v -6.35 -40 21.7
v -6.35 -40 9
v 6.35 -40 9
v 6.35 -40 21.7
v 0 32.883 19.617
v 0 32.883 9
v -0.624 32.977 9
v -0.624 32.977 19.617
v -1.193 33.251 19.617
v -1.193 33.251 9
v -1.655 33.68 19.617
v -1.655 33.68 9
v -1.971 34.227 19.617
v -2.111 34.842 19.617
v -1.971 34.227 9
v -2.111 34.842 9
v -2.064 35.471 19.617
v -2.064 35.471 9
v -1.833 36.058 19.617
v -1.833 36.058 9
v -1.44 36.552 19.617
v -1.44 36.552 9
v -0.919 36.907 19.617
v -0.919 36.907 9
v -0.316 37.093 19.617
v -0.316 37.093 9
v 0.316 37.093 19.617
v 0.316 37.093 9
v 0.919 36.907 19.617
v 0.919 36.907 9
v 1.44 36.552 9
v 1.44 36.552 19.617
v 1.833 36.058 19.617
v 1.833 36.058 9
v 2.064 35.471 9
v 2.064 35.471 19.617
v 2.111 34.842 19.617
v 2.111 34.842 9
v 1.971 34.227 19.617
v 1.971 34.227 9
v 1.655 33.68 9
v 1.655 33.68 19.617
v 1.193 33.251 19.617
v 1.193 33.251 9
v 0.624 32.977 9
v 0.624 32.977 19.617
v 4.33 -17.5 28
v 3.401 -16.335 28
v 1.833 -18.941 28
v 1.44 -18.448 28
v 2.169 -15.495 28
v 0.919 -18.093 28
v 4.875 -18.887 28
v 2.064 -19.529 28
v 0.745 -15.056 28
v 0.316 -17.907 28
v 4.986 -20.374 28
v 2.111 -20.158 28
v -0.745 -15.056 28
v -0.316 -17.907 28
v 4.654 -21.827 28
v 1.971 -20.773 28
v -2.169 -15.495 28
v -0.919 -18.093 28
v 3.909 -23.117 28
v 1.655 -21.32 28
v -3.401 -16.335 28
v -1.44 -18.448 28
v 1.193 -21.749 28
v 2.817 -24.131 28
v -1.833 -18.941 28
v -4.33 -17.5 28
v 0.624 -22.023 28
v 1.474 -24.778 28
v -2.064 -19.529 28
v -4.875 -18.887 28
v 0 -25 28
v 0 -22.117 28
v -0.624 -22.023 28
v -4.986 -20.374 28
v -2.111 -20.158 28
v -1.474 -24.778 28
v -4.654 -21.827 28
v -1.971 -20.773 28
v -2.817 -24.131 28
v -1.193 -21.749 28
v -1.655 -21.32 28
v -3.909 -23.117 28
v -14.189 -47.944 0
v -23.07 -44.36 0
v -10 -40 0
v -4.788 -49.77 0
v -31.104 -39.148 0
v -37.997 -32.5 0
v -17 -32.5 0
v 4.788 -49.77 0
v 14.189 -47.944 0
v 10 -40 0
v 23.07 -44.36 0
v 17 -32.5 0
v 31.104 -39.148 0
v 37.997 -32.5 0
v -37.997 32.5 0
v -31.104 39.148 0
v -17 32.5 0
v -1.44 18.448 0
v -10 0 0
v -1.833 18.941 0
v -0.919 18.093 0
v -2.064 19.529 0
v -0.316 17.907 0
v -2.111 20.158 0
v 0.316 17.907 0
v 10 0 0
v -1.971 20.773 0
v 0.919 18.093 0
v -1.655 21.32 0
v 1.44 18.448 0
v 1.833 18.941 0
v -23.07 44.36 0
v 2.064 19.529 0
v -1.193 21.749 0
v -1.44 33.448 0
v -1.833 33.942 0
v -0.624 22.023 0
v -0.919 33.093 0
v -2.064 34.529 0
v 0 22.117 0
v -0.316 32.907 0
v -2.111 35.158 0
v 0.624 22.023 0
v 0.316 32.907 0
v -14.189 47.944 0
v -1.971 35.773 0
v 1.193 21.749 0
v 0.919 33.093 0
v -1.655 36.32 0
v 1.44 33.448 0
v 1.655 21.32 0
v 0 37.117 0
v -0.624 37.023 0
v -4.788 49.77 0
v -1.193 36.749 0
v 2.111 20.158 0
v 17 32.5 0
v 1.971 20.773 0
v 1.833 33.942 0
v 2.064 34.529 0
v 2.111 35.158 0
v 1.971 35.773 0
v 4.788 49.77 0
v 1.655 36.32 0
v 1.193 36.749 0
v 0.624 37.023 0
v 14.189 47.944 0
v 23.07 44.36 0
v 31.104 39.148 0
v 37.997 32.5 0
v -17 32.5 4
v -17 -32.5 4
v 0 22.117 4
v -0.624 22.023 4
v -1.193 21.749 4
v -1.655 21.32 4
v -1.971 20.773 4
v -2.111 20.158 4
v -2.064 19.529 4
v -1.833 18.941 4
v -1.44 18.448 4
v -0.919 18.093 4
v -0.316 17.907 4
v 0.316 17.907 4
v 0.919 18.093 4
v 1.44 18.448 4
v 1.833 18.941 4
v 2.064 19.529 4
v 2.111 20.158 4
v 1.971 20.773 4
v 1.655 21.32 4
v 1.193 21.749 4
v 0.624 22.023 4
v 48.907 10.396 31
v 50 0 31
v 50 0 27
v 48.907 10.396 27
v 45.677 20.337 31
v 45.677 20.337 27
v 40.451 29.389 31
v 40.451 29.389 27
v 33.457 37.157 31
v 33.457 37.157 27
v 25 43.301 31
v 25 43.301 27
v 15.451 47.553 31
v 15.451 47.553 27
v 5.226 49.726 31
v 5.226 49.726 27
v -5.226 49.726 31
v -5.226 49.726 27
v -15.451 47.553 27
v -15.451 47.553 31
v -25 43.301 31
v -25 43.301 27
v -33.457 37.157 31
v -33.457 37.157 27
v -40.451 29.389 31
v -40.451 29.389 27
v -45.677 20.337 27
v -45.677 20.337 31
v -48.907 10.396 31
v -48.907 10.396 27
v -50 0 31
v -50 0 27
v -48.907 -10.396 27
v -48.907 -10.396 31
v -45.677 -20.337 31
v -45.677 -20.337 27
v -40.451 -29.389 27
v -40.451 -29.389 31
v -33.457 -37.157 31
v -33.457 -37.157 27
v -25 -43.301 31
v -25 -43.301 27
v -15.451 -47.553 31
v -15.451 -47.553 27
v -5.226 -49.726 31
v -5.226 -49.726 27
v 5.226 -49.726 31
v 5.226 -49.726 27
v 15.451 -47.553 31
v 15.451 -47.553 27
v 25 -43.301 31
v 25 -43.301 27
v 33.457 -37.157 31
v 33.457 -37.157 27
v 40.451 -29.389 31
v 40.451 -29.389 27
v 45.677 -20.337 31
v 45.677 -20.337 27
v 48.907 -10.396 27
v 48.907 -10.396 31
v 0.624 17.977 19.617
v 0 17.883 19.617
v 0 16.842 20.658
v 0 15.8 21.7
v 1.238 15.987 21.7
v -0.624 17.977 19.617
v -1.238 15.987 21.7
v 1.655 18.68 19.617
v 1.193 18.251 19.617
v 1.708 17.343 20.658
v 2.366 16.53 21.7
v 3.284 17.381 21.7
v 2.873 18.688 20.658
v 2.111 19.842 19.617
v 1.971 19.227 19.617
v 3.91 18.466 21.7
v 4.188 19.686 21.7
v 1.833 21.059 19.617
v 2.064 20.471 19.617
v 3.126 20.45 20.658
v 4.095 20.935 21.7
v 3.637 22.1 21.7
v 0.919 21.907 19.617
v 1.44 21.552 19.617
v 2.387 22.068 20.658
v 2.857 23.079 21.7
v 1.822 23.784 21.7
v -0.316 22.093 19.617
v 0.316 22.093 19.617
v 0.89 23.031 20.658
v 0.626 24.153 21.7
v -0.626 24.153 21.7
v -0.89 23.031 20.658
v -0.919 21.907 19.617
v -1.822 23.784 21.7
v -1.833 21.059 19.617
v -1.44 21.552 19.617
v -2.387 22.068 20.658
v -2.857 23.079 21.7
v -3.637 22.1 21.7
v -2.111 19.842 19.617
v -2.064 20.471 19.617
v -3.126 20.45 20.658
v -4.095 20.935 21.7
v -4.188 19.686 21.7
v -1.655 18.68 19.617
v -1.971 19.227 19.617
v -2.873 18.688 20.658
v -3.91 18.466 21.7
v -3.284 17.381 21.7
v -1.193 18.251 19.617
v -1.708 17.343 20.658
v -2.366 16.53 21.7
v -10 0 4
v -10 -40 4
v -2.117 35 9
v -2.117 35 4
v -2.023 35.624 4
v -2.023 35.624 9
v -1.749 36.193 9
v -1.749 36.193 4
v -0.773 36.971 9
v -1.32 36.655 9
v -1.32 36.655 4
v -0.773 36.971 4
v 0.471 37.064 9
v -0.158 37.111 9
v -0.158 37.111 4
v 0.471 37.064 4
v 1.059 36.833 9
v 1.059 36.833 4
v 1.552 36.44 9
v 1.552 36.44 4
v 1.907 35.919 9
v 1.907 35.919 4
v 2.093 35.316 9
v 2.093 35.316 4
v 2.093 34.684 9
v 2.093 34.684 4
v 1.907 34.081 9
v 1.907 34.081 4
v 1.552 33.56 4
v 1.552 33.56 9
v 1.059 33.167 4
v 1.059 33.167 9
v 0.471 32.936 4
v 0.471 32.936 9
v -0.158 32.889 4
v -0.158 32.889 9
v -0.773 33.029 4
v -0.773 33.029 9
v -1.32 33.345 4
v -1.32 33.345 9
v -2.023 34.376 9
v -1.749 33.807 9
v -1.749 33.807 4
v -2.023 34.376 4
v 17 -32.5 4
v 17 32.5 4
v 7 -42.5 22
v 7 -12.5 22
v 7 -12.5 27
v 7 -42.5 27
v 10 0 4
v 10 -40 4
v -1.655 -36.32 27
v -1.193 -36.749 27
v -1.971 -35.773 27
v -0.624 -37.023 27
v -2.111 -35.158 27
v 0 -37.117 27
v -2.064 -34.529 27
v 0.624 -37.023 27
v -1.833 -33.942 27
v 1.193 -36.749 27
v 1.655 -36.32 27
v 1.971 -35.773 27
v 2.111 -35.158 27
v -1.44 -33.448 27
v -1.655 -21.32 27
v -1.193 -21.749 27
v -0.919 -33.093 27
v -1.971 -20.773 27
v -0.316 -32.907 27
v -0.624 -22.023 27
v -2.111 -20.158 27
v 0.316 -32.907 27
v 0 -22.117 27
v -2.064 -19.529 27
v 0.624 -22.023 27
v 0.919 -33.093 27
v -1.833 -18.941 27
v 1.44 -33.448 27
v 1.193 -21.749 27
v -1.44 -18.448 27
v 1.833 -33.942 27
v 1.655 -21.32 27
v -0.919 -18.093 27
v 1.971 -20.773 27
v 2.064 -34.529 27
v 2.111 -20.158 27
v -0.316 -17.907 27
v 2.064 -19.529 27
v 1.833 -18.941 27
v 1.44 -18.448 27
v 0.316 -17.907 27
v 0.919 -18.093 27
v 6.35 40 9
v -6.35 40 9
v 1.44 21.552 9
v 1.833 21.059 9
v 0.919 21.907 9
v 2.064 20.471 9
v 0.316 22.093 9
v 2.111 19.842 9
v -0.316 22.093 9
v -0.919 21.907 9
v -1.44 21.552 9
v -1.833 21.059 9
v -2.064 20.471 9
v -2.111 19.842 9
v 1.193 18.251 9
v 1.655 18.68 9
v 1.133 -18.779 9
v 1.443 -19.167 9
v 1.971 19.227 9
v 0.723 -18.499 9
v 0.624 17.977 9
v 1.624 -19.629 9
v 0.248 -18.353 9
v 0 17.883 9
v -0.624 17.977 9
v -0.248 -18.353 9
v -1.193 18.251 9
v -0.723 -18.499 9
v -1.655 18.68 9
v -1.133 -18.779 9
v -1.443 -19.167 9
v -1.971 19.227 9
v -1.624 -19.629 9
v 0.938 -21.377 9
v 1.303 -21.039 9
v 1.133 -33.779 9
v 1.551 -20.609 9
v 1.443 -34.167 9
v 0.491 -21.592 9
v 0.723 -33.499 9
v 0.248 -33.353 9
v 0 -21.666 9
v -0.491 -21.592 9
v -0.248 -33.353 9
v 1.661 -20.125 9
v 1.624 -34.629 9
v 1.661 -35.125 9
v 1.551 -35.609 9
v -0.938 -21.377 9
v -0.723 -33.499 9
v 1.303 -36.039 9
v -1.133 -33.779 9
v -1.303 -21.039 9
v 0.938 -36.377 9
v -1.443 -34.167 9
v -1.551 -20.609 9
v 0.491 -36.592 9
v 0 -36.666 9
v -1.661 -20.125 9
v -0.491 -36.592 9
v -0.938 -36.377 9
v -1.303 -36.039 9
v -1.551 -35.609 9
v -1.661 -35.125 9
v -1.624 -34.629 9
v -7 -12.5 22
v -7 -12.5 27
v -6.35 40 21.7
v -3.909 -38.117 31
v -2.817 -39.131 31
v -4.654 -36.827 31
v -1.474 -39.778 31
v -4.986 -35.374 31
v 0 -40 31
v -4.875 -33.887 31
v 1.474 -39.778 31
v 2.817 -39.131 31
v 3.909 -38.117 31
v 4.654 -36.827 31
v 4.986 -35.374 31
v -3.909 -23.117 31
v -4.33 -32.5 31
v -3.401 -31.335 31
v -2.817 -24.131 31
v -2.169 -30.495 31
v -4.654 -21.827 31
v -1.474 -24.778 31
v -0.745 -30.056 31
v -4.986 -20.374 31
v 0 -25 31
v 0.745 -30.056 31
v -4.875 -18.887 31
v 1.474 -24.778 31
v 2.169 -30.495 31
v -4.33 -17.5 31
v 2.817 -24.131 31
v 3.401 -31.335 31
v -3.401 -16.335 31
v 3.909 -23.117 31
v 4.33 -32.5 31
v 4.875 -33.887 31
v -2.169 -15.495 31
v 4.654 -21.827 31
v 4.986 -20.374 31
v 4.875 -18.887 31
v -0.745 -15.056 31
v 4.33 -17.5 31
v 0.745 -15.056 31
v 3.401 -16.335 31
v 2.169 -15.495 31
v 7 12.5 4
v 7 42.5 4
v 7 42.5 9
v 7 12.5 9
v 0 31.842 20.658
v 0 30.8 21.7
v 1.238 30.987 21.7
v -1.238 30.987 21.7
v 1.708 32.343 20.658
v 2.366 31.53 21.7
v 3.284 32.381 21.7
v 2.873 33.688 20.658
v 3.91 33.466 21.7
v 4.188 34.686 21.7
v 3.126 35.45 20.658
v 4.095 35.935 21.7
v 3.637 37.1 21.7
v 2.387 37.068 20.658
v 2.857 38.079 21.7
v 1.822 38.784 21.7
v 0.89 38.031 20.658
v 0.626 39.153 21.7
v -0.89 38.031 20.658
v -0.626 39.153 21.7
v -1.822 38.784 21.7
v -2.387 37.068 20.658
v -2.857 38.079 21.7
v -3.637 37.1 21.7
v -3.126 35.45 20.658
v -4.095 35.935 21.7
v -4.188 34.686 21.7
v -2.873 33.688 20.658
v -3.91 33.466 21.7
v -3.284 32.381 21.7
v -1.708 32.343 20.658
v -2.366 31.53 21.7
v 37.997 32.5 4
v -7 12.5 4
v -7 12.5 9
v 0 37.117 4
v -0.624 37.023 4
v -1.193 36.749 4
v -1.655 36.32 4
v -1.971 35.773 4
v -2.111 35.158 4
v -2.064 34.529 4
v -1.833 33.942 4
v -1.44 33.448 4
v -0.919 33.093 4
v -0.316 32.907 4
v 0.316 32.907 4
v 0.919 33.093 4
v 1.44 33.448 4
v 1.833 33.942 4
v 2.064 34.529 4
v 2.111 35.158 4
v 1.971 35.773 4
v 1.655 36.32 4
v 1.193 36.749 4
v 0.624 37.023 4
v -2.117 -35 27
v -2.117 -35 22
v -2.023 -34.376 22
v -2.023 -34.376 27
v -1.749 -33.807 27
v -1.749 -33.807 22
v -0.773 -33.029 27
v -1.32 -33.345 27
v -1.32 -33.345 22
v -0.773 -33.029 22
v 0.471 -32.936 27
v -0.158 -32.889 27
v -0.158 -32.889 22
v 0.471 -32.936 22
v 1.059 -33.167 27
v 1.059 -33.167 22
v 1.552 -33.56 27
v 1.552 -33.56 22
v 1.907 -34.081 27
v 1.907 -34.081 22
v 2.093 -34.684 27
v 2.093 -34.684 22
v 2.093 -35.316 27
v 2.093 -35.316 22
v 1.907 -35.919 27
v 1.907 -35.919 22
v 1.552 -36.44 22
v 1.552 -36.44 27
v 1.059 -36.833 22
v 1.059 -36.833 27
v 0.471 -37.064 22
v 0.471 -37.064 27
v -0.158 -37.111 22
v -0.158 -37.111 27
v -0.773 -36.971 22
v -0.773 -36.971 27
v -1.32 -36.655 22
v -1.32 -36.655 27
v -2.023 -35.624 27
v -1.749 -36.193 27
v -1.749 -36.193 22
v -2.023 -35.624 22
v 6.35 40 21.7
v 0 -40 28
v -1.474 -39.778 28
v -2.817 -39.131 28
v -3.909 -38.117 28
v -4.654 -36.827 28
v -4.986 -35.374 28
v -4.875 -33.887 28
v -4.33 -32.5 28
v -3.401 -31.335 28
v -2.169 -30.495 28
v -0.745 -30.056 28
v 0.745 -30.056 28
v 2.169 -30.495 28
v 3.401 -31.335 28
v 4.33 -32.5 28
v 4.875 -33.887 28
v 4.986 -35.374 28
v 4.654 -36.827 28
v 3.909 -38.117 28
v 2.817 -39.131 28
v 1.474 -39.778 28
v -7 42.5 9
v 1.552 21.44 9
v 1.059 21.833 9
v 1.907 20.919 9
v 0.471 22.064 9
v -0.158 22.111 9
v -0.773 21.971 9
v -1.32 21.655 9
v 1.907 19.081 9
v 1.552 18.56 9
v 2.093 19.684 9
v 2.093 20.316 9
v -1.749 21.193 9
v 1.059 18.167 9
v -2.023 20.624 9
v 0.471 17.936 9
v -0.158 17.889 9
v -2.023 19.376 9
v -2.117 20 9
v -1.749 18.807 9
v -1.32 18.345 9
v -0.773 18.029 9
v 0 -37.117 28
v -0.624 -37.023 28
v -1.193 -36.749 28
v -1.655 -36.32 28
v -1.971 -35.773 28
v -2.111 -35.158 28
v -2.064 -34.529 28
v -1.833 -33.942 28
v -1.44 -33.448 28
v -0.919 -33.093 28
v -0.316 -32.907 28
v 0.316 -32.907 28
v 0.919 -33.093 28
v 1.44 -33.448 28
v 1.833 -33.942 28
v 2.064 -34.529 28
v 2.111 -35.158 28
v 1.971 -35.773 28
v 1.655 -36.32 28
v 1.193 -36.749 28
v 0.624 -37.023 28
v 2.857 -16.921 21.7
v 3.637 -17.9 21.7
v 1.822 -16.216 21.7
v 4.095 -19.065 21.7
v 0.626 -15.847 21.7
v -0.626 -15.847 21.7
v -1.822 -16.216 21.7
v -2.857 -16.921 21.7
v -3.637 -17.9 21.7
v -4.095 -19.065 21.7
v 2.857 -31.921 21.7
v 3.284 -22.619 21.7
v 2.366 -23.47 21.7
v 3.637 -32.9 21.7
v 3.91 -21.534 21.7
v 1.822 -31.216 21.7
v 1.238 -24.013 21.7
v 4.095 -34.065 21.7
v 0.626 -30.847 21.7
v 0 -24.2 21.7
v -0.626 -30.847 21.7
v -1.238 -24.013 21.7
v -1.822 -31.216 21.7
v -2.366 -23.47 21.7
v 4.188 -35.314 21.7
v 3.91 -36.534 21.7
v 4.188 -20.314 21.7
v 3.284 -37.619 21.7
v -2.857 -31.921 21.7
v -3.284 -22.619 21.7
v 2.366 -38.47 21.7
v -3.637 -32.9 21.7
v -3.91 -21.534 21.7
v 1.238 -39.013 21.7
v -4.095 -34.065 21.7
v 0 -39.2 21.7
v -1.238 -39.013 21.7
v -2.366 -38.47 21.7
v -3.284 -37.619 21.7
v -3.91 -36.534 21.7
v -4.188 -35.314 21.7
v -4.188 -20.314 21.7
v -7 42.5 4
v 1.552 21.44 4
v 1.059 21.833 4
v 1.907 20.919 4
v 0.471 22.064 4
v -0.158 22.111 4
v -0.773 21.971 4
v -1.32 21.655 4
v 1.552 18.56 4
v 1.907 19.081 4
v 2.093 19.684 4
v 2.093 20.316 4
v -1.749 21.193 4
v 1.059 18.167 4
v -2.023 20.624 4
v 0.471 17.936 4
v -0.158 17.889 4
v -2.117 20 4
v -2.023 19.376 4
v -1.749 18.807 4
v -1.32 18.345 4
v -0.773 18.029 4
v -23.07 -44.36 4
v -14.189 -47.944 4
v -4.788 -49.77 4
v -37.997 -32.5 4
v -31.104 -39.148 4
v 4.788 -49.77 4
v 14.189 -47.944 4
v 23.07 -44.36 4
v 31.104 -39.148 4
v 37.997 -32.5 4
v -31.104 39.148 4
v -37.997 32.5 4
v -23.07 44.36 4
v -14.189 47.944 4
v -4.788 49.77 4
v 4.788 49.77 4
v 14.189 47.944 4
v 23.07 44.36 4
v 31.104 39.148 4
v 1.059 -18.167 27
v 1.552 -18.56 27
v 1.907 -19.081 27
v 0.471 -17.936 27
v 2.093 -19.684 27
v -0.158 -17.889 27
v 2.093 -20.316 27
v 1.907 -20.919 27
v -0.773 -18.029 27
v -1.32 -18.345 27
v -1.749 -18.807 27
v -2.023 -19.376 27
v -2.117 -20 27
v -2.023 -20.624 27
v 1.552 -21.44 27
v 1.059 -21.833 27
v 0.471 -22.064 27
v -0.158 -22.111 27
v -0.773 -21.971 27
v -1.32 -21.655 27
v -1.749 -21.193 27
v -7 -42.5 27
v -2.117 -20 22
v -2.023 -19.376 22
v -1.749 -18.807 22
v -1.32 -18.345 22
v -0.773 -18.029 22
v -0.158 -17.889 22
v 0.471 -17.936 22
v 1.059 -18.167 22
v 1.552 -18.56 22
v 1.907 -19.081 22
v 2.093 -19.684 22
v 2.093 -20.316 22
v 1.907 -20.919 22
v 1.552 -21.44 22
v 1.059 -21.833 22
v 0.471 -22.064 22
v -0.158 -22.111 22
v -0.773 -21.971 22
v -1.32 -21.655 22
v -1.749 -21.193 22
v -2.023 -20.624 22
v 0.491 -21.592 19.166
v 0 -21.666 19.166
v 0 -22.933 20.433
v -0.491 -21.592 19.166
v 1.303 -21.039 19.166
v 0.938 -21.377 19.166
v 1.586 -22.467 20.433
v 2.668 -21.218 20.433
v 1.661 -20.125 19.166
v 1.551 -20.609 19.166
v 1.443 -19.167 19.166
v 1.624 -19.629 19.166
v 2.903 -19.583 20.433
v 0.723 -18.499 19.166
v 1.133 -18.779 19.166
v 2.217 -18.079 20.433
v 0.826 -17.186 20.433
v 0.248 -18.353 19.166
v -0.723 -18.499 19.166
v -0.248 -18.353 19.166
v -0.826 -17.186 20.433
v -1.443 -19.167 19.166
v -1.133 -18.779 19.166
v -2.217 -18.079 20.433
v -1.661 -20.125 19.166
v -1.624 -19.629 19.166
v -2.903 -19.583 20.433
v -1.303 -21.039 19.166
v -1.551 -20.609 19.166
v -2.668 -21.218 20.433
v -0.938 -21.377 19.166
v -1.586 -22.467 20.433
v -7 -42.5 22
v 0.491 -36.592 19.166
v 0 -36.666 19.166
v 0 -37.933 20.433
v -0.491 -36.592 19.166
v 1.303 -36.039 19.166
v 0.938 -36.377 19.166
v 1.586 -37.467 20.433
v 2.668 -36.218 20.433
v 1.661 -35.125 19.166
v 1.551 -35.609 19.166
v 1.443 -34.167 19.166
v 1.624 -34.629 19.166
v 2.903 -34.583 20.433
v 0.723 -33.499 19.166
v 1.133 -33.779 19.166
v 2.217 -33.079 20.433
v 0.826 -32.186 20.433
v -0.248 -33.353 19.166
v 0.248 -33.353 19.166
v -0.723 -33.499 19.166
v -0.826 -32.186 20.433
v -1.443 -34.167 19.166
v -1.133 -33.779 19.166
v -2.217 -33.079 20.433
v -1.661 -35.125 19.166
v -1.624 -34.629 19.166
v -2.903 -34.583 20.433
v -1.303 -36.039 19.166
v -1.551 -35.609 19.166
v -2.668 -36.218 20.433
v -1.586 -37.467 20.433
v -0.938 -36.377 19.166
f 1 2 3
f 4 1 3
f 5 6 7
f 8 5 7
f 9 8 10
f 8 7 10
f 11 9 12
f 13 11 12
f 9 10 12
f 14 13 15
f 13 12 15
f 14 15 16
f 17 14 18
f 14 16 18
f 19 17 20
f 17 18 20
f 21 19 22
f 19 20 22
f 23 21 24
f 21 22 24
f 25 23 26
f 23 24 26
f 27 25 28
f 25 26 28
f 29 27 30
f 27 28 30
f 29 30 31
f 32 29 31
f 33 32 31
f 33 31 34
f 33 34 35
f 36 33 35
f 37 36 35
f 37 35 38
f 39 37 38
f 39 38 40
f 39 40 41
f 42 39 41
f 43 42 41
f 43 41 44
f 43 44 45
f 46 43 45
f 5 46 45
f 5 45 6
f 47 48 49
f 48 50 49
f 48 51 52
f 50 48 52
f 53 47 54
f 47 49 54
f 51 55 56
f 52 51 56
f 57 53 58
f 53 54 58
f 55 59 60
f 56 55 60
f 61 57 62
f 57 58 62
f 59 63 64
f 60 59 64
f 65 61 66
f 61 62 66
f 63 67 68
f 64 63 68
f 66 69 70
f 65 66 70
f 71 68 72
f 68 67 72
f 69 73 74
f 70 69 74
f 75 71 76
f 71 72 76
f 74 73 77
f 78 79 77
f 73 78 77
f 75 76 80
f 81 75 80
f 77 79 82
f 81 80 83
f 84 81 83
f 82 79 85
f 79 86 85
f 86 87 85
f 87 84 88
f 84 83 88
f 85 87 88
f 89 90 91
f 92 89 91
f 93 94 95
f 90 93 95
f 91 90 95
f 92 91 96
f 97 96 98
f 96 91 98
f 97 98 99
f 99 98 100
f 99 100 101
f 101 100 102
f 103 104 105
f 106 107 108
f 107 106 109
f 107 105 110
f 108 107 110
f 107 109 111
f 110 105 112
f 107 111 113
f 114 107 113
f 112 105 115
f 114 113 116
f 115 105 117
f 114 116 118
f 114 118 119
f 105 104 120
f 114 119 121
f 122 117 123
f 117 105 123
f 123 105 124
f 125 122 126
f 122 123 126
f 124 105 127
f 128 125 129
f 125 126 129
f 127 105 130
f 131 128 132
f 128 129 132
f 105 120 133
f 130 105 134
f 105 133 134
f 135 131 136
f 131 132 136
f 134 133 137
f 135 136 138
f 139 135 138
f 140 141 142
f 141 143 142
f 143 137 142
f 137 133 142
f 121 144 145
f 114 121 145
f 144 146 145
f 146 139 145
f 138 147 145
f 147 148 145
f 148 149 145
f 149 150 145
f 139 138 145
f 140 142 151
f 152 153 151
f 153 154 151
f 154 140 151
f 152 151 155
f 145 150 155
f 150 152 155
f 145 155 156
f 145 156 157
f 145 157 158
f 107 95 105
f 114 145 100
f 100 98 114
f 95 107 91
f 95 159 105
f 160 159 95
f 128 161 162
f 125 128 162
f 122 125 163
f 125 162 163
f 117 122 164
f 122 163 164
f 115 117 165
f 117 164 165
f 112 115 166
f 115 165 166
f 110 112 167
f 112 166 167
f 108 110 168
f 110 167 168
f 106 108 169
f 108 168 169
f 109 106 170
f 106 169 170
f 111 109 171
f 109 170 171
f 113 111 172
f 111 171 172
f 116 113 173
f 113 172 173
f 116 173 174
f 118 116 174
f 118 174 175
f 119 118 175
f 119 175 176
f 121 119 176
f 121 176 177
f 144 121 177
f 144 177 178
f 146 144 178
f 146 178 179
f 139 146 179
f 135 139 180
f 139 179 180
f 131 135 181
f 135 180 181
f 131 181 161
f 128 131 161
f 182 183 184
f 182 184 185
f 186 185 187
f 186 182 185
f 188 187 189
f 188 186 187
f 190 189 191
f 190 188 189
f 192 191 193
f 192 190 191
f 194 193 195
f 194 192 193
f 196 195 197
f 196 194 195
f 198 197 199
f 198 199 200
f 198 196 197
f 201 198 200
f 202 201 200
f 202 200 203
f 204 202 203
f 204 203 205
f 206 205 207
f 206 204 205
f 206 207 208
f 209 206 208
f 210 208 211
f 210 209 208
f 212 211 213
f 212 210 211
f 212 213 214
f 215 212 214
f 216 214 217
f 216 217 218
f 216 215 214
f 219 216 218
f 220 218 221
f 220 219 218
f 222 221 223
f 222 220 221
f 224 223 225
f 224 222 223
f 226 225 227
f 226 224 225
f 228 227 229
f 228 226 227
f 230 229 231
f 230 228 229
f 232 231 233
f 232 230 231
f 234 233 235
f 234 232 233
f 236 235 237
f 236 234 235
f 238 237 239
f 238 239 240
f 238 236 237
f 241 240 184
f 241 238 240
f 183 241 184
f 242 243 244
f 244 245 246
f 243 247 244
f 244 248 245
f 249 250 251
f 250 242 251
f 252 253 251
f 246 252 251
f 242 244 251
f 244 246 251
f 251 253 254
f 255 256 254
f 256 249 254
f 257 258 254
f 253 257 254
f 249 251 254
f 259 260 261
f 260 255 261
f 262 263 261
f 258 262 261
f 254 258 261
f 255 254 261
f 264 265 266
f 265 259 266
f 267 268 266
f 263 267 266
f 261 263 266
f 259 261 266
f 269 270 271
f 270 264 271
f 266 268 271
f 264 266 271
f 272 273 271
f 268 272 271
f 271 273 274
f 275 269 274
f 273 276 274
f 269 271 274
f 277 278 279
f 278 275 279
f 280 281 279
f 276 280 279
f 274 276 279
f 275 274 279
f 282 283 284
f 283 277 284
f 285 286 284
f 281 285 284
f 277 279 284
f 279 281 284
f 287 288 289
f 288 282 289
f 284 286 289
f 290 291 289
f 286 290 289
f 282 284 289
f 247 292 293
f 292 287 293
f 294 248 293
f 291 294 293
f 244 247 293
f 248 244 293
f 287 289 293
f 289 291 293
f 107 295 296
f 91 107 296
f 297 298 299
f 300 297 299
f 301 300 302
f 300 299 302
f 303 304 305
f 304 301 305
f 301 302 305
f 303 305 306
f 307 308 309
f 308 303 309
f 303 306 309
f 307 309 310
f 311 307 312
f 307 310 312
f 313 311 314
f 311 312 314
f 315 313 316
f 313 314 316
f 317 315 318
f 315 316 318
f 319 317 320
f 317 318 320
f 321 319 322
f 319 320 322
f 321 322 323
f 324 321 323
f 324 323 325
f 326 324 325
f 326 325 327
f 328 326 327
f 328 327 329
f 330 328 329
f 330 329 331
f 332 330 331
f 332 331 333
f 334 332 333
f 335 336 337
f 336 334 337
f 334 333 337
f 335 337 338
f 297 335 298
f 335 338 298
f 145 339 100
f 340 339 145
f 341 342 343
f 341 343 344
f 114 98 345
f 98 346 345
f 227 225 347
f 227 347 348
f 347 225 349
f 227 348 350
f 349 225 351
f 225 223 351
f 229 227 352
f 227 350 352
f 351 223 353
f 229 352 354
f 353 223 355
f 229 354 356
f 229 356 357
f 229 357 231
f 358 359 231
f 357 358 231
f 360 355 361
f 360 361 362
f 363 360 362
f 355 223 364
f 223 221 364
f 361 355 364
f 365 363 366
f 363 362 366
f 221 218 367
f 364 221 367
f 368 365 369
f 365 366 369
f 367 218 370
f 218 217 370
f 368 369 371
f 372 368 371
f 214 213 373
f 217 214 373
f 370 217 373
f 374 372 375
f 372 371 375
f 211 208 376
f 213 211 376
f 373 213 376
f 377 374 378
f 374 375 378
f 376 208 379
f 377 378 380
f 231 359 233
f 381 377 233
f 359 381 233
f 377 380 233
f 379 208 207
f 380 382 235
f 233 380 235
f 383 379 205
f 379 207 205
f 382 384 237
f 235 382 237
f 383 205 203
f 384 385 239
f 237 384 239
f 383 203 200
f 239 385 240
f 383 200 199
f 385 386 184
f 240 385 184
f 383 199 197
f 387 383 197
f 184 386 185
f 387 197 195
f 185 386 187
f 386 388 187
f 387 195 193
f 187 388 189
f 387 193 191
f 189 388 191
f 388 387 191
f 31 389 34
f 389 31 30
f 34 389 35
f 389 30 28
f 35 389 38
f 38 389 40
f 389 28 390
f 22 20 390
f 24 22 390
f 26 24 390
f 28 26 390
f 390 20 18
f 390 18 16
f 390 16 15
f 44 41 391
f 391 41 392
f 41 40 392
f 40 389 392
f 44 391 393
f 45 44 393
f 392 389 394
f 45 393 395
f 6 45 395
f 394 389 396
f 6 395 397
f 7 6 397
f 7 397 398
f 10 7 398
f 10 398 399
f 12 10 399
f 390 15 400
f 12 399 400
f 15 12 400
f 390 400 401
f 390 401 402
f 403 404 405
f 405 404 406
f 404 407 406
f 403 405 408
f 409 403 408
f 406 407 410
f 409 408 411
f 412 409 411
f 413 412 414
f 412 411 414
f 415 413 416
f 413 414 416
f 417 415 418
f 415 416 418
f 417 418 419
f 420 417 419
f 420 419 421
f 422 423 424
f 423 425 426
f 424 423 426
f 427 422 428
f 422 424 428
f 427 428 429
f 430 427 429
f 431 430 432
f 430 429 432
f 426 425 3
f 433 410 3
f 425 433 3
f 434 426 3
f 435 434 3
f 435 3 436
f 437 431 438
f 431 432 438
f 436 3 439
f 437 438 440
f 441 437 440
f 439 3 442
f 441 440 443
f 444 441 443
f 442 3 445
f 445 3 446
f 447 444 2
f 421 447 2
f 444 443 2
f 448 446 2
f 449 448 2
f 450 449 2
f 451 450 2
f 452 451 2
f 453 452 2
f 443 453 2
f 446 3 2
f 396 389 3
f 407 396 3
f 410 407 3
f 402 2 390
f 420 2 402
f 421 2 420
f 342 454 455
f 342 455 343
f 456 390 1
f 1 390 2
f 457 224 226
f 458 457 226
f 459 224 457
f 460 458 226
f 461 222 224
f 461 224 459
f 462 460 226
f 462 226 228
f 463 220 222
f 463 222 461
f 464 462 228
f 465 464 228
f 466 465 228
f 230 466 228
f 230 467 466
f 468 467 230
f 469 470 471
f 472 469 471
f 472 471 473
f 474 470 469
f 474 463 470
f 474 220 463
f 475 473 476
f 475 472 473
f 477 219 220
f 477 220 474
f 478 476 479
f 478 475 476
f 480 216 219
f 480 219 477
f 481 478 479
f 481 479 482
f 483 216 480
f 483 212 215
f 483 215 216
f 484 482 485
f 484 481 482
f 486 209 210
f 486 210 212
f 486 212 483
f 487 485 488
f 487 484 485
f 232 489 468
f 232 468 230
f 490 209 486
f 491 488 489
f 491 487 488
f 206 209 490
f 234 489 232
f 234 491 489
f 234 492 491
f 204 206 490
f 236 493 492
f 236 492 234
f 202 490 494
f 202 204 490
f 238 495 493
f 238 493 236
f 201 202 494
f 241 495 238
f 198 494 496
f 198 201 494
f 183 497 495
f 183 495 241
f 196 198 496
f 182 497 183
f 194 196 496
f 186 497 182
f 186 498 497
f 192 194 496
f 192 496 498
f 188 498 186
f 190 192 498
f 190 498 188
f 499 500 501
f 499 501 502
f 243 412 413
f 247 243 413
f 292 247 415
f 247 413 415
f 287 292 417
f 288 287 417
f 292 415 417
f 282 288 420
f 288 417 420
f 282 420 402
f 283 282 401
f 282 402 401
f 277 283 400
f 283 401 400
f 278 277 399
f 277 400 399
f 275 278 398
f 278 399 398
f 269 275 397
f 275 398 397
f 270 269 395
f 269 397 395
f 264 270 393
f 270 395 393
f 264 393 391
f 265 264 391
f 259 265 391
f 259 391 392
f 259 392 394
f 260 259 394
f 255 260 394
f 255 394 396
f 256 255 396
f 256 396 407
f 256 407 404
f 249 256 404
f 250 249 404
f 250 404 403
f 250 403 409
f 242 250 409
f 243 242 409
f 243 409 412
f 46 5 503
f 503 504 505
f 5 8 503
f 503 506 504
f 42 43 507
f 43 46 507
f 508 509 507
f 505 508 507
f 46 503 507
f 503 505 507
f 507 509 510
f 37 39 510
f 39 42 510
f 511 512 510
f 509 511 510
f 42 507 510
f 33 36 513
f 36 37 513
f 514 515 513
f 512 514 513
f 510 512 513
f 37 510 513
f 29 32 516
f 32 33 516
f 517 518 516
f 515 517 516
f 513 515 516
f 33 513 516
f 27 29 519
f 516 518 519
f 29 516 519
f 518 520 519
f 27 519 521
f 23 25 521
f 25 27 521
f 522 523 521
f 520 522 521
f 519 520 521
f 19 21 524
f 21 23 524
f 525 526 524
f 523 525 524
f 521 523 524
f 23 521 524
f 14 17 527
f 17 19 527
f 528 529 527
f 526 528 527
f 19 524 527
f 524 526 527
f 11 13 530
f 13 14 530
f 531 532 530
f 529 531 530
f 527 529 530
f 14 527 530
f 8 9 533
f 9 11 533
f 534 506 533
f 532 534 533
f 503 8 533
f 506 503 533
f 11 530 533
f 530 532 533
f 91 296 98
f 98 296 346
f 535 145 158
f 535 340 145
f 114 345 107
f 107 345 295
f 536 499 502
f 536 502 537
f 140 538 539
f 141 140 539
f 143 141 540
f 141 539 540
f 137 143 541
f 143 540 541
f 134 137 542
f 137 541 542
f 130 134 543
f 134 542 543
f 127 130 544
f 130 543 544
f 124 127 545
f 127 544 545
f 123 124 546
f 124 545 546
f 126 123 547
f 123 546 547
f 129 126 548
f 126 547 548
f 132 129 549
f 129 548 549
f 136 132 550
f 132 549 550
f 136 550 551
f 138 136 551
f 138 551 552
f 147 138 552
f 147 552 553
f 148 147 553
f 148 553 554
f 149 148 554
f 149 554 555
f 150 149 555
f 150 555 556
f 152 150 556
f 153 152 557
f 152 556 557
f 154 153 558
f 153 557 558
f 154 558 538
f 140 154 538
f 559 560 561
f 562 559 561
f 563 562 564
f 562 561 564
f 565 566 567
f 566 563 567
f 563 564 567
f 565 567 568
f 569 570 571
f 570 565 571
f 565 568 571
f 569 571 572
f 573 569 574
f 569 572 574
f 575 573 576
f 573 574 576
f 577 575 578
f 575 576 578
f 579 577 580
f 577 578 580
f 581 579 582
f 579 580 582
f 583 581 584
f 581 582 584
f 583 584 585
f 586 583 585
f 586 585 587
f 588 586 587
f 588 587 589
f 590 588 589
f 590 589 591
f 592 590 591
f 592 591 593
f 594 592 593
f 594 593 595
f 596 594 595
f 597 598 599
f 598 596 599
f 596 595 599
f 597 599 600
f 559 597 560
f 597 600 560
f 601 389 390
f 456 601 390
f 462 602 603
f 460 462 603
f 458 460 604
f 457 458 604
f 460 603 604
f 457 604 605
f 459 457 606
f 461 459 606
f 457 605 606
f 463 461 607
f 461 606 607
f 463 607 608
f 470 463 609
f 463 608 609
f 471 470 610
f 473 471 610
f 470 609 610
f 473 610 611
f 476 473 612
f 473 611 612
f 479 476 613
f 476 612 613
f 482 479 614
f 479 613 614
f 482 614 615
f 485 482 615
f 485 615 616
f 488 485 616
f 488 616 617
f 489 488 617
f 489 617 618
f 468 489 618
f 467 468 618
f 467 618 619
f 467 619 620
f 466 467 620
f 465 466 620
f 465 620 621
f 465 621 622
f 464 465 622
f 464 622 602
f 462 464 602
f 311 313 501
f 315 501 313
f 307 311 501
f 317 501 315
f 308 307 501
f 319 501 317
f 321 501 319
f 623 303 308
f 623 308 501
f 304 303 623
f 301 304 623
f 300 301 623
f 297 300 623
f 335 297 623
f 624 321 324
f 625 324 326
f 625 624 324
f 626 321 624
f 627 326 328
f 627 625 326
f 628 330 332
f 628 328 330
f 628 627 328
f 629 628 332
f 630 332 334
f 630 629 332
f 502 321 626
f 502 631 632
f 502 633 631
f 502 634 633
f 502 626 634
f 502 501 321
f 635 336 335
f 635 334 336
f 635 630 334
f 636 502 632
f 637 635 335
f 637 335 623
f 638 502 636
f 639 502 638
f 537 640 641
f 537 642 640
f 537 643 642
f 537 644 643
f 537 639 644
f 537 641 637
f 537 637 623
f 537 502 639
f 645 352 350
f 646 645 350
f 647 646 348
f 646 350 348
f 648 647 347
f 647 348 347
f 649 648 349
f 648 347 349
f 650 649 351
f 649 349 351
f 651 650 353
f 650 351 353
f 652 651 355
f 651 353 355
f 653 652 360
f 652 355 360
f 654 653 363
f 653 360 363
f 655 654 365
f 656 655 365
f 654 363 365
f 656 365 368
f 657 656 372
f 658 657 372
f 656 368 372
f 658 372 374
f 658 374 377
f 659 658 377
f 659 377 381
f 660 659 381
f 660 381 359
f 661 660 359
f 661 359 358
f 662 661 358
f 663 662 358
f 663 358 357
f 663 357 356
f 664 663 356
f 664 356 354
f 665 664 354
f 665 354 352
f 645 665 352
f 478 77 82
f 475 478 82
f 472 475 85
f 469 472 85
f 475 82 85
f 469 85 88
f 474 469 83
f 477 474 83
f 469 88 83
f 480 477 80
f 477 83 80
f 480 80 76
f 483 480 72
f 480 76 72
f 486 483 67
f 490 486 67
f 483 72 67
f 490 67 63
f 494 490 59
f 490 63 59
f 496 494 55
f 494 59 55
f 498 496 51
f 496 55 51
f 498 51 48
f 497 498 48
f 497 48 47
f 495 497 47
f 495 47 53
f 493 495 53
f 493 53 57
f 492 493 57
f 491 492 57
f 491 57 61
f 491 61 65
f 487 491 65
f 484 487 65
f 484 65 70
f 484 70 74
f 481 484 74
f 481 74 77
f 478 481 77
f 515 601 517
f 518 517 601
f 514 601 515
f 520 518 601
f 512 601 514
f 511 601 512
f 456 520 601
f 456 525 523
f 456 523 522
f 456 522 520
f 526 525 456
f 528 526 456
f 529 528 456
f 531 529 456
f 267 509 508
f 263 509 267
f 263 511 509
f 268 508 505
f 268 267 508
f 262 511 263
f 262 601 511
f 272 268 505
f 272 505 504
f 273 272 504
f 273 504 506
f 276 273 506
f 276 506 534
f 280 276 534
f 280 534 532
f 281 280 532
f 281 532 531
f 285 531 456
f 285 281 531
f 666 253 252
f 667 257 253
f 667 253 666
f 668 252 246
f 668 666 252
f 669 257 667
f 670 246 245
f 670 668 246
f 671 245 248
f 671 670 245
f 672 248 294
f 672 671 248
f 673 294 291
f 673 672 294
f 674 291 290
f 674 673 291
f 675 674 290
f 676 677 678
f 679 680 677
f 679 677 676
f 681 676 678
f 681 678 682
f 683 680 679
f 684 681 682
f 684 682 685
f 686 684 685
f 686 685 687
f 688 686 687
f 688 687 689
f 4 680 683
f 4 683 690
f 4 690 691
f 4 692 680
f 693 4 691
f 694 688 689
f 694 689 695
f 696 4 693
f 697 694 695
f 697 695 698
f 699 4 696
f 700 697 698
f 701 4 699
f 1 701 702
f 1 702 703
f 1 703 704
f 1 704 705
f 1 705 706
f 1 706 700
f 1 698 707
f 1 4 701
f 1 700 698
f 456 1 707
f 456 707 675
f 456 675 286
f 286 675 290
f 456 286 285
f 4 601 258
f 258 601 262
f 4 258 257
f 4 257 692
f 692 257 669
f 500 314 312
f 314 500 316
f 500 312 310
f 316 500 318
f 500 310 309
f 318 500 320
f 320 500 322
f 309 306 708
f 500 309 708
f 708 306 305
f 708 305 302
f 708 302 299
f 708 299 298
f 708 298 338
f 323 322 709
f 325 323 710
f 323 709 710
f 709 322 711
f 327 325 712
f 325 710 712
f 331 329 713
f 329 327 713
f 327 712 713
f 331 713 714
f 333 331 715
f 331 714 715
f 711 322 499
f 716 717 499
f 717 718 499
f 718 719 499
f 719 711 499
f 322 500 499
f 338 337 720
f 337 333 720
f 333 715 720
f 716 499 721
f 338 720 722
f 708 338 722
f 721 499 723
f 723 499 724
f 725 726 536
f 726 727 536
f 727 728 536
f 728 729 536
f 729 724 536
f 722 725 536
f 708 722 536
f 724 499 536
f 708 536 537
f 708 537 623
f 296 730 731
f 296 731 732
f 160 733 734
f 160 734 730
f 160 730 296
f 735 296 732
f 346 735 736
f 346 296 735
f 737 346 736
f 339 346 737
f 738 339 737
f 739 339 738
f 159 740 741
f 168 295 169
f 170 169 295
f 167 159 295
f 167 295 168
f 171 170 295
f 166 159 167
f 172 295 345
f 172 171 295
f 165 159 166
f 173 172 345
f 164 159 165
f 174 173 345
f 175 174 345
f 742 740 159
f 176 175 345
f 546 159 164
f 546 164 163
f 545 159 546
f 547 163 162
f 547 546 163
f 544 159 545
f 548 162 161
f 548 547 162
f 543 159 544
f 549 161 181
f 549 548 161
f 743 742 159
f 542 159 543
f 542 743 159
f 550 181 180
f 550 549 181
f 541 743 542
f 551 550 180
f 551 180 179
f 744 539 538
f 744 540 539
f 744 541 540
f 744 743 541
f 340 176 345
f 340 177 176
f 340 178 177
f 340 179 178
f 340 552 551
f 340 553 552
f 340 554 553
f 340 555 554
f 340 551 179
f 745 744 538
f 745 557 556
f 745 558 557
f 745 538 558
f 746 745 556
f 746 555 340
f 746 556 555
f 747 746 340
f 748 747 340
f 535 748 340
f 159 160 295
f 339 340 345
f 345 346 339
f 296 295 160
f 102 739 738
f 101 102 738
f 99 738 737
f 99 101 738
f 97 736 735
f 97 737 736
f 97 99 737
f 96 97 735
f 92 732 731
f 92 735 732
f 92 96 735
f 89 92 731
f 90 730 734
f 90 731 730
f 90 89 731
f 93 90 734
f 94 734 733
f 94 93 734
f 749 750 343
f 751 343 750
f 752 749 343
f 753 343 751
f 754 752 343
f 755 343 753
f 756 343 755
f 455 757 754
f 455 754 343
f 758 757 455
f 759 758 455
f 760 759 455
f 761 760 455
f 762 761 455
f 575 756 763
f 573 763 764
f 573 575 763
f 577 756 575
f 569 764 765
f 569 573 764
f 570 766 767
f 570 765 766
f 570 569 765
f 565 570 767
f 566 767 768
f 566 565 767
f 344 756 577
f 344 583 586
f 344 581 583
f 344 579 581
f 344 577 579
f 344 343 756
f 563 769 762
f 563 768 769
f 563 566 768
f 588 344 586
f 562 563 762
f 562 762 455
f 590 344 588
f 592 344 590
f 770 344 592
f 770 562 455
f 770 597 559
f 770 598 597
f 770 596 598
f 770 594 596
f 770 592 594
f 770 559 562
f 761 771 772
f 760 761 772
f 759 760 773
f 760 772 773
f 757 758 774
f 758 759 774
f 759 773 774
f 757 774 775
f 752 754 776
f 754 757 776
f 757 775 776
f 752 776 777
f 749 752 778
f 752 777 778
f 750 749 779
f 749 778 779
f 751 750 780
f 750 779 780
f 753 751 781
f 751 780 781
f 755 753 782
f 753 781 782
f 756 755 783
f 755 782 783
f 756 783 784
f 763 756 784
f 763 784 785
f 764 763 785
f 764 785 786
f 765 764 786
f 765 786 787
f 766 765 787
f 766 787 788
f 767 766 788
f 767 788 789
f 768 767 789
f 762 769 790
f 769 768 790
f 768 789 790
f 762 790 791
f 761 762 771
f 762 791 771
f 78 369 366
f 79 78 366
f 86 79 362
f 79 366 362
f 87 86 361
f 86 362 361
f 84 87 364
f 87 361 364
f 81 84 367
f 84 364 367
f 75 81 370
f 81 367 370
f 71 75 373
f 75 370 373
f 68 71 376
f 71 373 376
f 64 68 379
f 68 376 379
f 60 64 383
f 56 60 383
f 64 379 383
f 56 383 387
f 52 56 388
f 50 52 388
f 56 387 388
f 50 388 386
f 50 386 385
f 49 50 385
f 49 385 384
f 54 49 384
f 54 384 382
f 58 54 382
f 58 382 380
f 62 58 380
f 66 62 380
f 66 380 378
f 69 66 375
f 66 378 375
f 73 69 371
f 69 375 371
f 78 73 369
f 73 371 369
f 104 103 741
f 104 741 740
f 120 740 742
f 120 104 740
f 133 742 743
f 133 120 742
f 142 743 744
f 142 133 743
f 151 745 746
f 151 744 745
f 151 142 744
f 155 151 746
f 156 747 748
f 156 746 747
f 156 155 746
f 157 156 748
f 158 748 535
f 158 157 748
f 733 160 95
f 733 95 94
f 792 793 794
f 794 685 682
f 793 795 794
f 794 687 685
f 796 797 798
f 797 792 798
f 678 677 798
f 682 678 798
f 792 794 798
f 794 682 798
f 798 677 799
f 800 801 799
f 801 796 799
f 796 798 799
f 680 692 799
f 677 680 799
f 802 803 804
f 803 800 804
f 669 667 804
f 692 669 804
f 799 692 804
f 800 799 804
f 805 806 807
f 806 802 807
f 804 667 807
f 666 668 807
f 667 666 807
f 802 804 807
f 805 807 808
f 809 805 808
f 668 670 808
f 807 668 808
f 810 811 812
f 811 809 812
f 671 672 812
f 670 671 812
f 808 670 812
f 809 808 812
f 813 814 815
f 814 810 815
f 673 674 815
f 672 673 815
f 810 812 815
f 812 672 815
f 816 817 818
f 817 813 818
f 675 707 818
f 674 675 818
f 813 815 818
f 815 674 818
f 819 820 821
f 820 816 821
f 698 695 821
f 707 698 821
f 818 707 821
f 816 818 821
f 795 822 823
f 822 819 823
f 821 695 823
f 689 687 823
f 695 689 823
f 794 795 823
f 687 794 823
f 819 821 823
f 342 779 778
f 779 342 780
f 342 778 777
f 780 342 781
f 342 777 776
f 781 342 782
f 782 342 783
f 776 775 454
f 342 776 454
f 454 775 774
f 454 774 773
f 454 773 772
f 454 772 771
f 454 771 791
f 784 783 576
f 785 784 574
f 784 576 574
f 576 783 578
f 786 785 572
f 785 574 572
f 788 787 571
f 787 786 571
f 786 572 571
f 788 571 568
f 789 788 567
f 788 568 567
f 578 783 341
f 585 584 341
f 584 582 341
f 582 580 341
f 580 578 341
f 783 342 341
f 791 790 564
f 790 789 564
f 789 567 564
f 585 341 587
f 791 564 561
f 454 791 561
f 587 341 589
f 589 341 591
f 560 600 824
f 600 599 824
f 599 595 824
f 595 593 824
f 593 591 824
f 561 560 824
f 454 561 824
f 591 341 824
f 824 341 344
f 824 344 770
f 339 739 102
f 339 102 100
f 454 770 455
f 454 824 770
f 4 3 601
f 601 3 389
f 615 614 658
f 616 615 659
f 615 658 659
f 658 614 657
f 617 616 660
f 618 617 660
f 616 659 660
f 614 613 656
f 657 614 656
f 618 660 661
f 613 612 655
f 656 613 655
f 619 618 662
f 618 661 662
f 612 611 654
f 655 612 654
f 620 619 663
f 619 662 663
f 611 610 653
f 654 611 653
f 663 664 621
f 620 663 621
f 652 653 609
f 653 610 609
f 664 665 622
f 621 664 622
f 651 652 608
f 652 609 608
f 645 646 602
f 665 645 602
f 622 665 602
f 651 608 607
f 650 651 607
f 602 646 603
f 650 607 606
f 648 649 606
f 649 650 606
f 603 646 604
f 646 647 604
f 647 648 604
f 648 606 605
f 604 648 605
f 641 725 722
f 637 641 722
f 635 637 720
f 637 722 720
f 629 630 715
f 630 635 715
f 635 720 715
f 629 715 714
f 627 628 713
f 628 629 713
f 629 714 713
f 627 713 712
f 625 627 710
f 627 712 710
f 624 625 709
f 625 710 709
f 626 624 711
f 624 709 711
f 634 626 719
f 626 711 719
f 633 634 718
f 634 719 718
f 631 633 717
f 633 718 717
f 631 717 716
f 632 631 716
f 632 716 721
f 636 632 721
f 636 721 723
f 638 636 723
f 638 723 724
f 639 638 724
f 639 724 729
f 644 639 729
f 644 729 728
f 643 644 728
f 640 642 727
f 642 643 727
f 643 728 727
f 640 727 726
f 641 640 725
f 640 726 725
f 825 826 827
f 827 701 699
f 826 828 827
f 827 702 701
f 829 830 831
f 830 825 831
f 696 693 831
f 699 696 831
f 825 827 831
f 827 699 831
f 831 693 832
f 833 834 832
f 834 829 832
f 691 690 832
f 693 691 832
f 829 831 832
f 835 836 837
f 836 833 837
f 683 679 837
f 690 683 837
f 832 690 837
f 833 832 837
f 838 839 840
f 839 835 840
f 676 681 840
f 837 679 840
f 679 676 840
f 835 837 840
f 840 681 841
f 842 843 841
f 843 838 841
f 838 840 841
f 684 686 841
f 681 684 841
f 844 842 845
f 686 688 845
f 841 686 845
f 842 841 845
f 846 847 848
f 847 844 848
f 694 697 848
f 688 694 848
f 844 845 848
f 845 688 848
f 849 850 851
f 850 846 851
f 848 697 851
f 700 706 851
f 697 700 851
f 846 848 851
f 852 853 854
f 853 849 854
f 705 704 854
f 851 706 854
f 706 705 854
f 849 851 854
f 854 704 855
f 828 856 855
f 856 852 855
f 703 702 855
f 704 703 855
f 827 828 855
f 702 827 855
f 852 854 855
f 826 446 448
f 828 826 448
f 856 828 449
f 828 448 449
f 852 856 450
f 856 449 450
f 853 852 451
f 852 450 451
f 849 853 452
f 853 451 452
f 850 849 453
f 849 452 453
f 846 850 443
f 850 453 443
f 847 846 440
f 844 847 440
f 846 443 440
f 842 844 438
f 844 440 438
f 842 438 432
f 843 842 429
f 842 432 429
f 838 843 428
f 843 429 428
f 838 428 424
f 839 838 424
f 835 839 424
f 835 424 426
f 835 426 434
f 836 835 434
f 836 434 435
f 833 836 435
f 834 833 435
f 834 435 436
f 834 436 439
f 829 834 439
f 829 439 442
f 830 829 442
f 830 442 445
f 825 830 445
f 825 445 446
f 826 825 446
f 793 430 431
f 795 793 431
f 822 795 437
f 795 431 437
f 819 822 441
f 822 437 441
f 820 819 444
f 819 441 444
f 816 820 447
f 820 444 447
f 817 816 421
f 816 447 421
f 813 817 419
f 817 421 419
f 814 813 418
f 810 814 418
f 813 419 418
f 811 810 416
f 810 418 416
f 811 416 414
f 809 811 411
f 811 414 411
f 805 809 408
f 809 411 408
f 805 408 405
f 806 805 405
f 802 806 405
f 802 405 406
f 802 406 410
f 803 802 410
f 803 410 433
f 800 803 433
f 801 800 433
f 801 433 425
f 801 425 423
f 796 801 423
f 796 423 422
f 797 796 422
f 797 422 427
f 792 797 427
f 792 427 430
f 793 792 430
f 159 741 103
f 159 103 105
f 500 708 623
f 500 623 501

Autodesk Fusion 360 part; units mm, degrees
sketch "Sketch3" plane through (0, 0, 0) normal (0, 0, 1) x (1, 0, 0) in component "BottomM5"
  circle A0 centre (0, 0) radius 50
  dimension "d4" = 100
extrude "Extrude1" add sketch "Sketch3" along normal blind 4 makes body 1 in component "BottomM5"
sketch "Sketch1" plane through (0, 0, 0) normal (0, 0, -1) x (1, 0, 0)
  circle A0 centre (0, 0) radius 50
  line L0 (-6.35, 40) -> (6.35, 40)
  line L1 (6.35, 40) -> (6.35, -40)
  line L2 (6.35, -40) -> (-6.35, -40)
  line L3 (-6.35, -40) -> (-6.35, 40)
  point P0 (0, -35)
  point P1 (0, -20)
  point P2 (0, 20)
  point P3 (0, 35)
  dimension "d17" = 12.7
  dimension "d18" = 80
  dimension "d19" = 6.35
  dimension "d20" = 6.35
  dimension "d21" = 15
  dimension "d22" = 5
  dimension "d23" = 15
  dimension "d24" = 5
  dimension "d25" = 6.35
  dimension "d26" = 40
hole "Hole1" at (0, 35, 0) at (0, 20, 0) direction (0, 0, 1) diameter 4.234 end through all bodies 1 1 in component "BottomM5"
sketch "Sketch1 (2)" plane through (0, 0, 4) normal (0, 0, 1) x (-1, 0, 0) in component "Padding M5"
  circle A0 centre (0, -35) radius 2.117
  circle A1 centre (0, -20) radius 2.117
  circle A2 centre (0, 0) radius 50
  line L0 (-7, -12.5) -> (7, -12.5)
  line L1 (7, -12.5) -> (7, -42.5)
  line L2 (7, -42.5) -> (-7, -42.5)
  line L3 (-7, -42.5) -> (-7, -12.5)
  dimension "d31" = 14
  dimension "d32" = 30
  dimension "d33" = 7
  dimension "d34" = 7.5
extrude "Extrude1'" add sketch "Sketch1 (2)" along normal blind 5 separate body contours L0 L1 L2 L3 makes body 2 in component "Padding M5"
thread "Thread1" thread offset 0 thread length 10 in component "Padding M5"
sketch "Sketch1 (3)" plane through (0, 0, 9) normal (0, 0, 1) x (-1, 0, 0) in component "Sensor"
  circle A0 centre (0, -35) radius 2.117
  circle A1 centre (0, -20) radius 2.117
  line L0 (-7, -42.5) -> (7, -42.5)
  line L1 (7, -42.5) -> (7, -12.5)
  line L2 (7, -12.5) -> (-7, -12.5)
  line L3 (-7, -12.5) -> (-7, -42.5)
  line L4 (-6.35, -40) -> (6.35, -40)
  line L5 (6.35, -40) -> (6.35, 40)
  line L6 (6.35, 40) -> (-6.35, 40)
  line L7 (-6.35, 40) -> (-6.35, -40)
  dimension "d39" = 12.7
  dimension "d40" = 80
  dimension "d41" = 6.35
  dimension "d42" = 40
extrude "Extrude1''" add sketch "Sketch1 (3)" along normal blind 12.7 separate body contours A0 | A1 | L2 L5 L6 L7 | L2 L4 L5 L7 makes body 3 in component "Sensor"
sketch "Sketch2" plane through (0, 0, 21.7) normal (0, 0, 1) x (-1, 0, 0) in component "Sensor"
  line L0 (-6.35, 40) -> (-6.35, -40)
  line L1 (-6.35, -40) -> (6.35, -40)
  line L2 (6.35, -40) -> (6.35, 40)
  line L3 (6.35, 40) -> (-6.35, 40)
  line L4 (6.35, -40) -> (6.35, 40)
  line L5 (6.35, 40) -> (-6.35, 40)
  line L6 (-6.35, -40) -> (6.35, -40)
  point P0 (0, -35)
  point P1 (0, -20)
  point P2 (0, 20)
  point P3 (0, 35)
  dimension "d45" = 6.35
  dimension "d46" = 15
  dimension "d47" = 15
  dimension "d48" = 5
  dimension "d49" = 6.35
  dimension "d50" = 5
hole "Hole1'" at (0, 20, 21.7) at (0, 35, 21.7) direction (0, 0, -1) diameter 4.234 depth 12.7 tip angle 180 countersink diameter 8.4 countersink angle 90 bodies 3 in component "Sensor"
hole "Hole2" at (0, -35, 21.7) at (0, -20, 21.7) direction (0, 0, -1) diameter 3.332 end up to surface (12.7 mm away) countersink diameter 8.4 countersink angle 90 bodies 3 in component "Sensor"
sketch "Sketch1 (4)" plane through (0, 0, 4) normal (0, 0, 1) x (-1, 0, 0) in component "Padding M4"
  circle A0 centre (0, -35) radius 2.117
  circle A1 centre (0, -20) radius 2.117
  line L0 (-7, -12.5) -> (7, -12.5)
  line L1 (7, -12.5) -> (7, -42.5)
  line L2 (7, -42.5) -> (-7, -42.5)
  line L3 (-7, -42.5) -> (-7, -12.5)
  dimension "d31_1" = 14
  dimension "d32_1" = 30
  dimension "d33_1" = 7
  dimension "d34_1" = 7.5
extrude "Extrude1'''" add sketch "Sketch1 (4)" along normal blind 5 separate body makes body 4 in component "Padding M4"
thread "Thread1'" thread offset 0 thread length 10 in component "Padding M4"
sketch "Sketch3 (2)" plane through (0, 0, 0) normal (0, 0, 1) x (1, 0, 0) in component "TopM4"
  circle A0 centre (0, 0) radius 50
  dimension "d4_1" = 100
extrude "Extrude1''''" add sketch "Sketch3 (2)" against normal blind 4 separate body makes body 5 in component "TopM4"
sketch "Sketch4" plane through (0, 0, 0) normal (0, 0, 1) x (1, 0, 0) in component "TopM4"
  line L0 (6.35, 40) -> (-6.35, 40)
  line L1 (-6.35, 40) -> (-6.35, -40)
  line L2 (-6.35, -40) -> (6.35, -40)
  line L3 (6.35, -40) -> (6.35, 40)
  point P0 (0, -35)
  point P1 (0, -20)
  point P2 (0, 20)
  point P3 (0, 35)
  dimension "d64" = 12.7
  dimension "d65" = 80
  dimension "d66" = 6.35
  dimension "d67" = 40
  dimension "d68" = 5
  dimension "d69" = 15
  dimension "d70" = 6.35
  dimension "d71" = 5
  dimension "d72" = 15
hole "Hole2'" at (0, -35, 0) at (0, -20, 0) direction (0, 0, -1) diameter 4.234 end up to surface (4 mm away) counterbore diameter 10 counterbore depth 3 bodies 5 in component "TopM4"
sketch "Sketch2 (2)" plane through (0, 0, 4) normal (0, 0, 1) x (-1, 0, 0)
  circle A0 centre (0, -35) radius 2.117
  circle A1 centre (0, -20) radius 2.117
  circle A2 centre (0, 0) radius 50
ref_plane "WorkPlane1" through (0, 0, 4) normal (0, 0, 1) x (-1, 0, 0)
sketch "Sketch3 (3)" plane through (0, 0, 4) normal (0, 0, 1) x (1, 0, 0)
  line L0 (-57, 32.5) -> (-17, 32.5)
  line L1 (-17, 32.5) -> (-17, -32.5)
  line L2 (-17, -32.5) -> (-57, -32.5)
  line L3 (-57, -32.5) -> (-57, 32.5)
  line L4 (17, 32.5) -> (57, 32.5)
  line L5 (57, 32.5) -> (57, -32.5)
  line L6 (57, -32.5) -> (17, -32.5)
  line L7 (17, -32.5) -> (17, 32.5)
  dimension "d80" = 40
  dimension "d81" = 65
  dimension "d82" = 17
  dimension "d83" = 32.5
  dimension "d84" = 65
  dimension "d85" = 40
  dimension "d86" = 57
  dimension "d87" = 32.5
extrude "Extrude2" cut sketch "Sketch3 (3)" against normal up to surface (4 mm away) bodies 1 in component "BottomM5"
sketch "Sketch4 (2)" plane through (0, 0, 4) normal (0, 0, 1) x (-1, 0, 0)
sketch "Sketch5" plane through (0, 0, 4) normal (0, 0, 1) x (-1, 0, 0)
  line L0 (-10, 0) -> (10, 0)
  line L1 (10, 0) -> (10, 40)
  line L2 (10, 40) -> (-10, 40)
  line L3 (-10, 40) -> (-10, 0)
  circle A0 centre (0, 0) radius 50
  dimension "d93" = 10
  dimension "d95" = 20
  dimension "d96" = 40
  dimension "d98" = 40
extrude "Extrude3" cut sketch "Sketch5" against normal up to surface (4 mm away) contours L0 L1 L2 L3 bodies 1 in component "BottomM5"
component "BottomM5" placed x (1, 0, 0) y (0, 1, 0) z (0, 0, 1) at (0, 0, 0)
component "Padding M5" placed x (1, 0, 0) y (0, 1, 0) z (0, 0, 1) at (0, 0, 0)
component "Sensor" placed x (1, 0, 0) y (0, 1, 0) z (0, 0, 1) at (0, 0, 0)
component "Padding M4" placed x (1, 0, 0) y (0, 1, 0) z (0, 0, 1) at (0, -55, 18)
component "TopM4" placed x (1, 0, 0) y (0, 1, 0) z (0, 0, 1) at (0, 0, 31)
equation "d15 = coaster_thickness"
equation "d19 = d17 / 2"
equation "d20 = d17 / 2"
equation "d25 = d17 / 2"
equation "d26 = d18 / 2"
equation "d33 = d31 / 2"
equation "d41 = d39 / 2"
equation "d42 = d40 / 2"
equation "d45 = ( 12.7 / 2 ) * 1 mm"
equation "d47 = d46"
equation "d48 = d50"
equation "d49 = d45"
equation "d33_1 = d31_1 / 2"
equation "d66 = d64 / 2"
equation "d67 = d65 / 2"
equation "d70 = d64 / 2"
equation "d71 = d68"
equation "d72 = d69"
equation "d83 = d81 / 2"
equation "d84 = d81"
equation "d85 = d80"
equation "d86 = d85 + 17 mm"
equation "d87 = d83"
equation "coaster_thickness = 4 mm"
equation "d93 = d95 / 2"
equation "d98 = d96"
